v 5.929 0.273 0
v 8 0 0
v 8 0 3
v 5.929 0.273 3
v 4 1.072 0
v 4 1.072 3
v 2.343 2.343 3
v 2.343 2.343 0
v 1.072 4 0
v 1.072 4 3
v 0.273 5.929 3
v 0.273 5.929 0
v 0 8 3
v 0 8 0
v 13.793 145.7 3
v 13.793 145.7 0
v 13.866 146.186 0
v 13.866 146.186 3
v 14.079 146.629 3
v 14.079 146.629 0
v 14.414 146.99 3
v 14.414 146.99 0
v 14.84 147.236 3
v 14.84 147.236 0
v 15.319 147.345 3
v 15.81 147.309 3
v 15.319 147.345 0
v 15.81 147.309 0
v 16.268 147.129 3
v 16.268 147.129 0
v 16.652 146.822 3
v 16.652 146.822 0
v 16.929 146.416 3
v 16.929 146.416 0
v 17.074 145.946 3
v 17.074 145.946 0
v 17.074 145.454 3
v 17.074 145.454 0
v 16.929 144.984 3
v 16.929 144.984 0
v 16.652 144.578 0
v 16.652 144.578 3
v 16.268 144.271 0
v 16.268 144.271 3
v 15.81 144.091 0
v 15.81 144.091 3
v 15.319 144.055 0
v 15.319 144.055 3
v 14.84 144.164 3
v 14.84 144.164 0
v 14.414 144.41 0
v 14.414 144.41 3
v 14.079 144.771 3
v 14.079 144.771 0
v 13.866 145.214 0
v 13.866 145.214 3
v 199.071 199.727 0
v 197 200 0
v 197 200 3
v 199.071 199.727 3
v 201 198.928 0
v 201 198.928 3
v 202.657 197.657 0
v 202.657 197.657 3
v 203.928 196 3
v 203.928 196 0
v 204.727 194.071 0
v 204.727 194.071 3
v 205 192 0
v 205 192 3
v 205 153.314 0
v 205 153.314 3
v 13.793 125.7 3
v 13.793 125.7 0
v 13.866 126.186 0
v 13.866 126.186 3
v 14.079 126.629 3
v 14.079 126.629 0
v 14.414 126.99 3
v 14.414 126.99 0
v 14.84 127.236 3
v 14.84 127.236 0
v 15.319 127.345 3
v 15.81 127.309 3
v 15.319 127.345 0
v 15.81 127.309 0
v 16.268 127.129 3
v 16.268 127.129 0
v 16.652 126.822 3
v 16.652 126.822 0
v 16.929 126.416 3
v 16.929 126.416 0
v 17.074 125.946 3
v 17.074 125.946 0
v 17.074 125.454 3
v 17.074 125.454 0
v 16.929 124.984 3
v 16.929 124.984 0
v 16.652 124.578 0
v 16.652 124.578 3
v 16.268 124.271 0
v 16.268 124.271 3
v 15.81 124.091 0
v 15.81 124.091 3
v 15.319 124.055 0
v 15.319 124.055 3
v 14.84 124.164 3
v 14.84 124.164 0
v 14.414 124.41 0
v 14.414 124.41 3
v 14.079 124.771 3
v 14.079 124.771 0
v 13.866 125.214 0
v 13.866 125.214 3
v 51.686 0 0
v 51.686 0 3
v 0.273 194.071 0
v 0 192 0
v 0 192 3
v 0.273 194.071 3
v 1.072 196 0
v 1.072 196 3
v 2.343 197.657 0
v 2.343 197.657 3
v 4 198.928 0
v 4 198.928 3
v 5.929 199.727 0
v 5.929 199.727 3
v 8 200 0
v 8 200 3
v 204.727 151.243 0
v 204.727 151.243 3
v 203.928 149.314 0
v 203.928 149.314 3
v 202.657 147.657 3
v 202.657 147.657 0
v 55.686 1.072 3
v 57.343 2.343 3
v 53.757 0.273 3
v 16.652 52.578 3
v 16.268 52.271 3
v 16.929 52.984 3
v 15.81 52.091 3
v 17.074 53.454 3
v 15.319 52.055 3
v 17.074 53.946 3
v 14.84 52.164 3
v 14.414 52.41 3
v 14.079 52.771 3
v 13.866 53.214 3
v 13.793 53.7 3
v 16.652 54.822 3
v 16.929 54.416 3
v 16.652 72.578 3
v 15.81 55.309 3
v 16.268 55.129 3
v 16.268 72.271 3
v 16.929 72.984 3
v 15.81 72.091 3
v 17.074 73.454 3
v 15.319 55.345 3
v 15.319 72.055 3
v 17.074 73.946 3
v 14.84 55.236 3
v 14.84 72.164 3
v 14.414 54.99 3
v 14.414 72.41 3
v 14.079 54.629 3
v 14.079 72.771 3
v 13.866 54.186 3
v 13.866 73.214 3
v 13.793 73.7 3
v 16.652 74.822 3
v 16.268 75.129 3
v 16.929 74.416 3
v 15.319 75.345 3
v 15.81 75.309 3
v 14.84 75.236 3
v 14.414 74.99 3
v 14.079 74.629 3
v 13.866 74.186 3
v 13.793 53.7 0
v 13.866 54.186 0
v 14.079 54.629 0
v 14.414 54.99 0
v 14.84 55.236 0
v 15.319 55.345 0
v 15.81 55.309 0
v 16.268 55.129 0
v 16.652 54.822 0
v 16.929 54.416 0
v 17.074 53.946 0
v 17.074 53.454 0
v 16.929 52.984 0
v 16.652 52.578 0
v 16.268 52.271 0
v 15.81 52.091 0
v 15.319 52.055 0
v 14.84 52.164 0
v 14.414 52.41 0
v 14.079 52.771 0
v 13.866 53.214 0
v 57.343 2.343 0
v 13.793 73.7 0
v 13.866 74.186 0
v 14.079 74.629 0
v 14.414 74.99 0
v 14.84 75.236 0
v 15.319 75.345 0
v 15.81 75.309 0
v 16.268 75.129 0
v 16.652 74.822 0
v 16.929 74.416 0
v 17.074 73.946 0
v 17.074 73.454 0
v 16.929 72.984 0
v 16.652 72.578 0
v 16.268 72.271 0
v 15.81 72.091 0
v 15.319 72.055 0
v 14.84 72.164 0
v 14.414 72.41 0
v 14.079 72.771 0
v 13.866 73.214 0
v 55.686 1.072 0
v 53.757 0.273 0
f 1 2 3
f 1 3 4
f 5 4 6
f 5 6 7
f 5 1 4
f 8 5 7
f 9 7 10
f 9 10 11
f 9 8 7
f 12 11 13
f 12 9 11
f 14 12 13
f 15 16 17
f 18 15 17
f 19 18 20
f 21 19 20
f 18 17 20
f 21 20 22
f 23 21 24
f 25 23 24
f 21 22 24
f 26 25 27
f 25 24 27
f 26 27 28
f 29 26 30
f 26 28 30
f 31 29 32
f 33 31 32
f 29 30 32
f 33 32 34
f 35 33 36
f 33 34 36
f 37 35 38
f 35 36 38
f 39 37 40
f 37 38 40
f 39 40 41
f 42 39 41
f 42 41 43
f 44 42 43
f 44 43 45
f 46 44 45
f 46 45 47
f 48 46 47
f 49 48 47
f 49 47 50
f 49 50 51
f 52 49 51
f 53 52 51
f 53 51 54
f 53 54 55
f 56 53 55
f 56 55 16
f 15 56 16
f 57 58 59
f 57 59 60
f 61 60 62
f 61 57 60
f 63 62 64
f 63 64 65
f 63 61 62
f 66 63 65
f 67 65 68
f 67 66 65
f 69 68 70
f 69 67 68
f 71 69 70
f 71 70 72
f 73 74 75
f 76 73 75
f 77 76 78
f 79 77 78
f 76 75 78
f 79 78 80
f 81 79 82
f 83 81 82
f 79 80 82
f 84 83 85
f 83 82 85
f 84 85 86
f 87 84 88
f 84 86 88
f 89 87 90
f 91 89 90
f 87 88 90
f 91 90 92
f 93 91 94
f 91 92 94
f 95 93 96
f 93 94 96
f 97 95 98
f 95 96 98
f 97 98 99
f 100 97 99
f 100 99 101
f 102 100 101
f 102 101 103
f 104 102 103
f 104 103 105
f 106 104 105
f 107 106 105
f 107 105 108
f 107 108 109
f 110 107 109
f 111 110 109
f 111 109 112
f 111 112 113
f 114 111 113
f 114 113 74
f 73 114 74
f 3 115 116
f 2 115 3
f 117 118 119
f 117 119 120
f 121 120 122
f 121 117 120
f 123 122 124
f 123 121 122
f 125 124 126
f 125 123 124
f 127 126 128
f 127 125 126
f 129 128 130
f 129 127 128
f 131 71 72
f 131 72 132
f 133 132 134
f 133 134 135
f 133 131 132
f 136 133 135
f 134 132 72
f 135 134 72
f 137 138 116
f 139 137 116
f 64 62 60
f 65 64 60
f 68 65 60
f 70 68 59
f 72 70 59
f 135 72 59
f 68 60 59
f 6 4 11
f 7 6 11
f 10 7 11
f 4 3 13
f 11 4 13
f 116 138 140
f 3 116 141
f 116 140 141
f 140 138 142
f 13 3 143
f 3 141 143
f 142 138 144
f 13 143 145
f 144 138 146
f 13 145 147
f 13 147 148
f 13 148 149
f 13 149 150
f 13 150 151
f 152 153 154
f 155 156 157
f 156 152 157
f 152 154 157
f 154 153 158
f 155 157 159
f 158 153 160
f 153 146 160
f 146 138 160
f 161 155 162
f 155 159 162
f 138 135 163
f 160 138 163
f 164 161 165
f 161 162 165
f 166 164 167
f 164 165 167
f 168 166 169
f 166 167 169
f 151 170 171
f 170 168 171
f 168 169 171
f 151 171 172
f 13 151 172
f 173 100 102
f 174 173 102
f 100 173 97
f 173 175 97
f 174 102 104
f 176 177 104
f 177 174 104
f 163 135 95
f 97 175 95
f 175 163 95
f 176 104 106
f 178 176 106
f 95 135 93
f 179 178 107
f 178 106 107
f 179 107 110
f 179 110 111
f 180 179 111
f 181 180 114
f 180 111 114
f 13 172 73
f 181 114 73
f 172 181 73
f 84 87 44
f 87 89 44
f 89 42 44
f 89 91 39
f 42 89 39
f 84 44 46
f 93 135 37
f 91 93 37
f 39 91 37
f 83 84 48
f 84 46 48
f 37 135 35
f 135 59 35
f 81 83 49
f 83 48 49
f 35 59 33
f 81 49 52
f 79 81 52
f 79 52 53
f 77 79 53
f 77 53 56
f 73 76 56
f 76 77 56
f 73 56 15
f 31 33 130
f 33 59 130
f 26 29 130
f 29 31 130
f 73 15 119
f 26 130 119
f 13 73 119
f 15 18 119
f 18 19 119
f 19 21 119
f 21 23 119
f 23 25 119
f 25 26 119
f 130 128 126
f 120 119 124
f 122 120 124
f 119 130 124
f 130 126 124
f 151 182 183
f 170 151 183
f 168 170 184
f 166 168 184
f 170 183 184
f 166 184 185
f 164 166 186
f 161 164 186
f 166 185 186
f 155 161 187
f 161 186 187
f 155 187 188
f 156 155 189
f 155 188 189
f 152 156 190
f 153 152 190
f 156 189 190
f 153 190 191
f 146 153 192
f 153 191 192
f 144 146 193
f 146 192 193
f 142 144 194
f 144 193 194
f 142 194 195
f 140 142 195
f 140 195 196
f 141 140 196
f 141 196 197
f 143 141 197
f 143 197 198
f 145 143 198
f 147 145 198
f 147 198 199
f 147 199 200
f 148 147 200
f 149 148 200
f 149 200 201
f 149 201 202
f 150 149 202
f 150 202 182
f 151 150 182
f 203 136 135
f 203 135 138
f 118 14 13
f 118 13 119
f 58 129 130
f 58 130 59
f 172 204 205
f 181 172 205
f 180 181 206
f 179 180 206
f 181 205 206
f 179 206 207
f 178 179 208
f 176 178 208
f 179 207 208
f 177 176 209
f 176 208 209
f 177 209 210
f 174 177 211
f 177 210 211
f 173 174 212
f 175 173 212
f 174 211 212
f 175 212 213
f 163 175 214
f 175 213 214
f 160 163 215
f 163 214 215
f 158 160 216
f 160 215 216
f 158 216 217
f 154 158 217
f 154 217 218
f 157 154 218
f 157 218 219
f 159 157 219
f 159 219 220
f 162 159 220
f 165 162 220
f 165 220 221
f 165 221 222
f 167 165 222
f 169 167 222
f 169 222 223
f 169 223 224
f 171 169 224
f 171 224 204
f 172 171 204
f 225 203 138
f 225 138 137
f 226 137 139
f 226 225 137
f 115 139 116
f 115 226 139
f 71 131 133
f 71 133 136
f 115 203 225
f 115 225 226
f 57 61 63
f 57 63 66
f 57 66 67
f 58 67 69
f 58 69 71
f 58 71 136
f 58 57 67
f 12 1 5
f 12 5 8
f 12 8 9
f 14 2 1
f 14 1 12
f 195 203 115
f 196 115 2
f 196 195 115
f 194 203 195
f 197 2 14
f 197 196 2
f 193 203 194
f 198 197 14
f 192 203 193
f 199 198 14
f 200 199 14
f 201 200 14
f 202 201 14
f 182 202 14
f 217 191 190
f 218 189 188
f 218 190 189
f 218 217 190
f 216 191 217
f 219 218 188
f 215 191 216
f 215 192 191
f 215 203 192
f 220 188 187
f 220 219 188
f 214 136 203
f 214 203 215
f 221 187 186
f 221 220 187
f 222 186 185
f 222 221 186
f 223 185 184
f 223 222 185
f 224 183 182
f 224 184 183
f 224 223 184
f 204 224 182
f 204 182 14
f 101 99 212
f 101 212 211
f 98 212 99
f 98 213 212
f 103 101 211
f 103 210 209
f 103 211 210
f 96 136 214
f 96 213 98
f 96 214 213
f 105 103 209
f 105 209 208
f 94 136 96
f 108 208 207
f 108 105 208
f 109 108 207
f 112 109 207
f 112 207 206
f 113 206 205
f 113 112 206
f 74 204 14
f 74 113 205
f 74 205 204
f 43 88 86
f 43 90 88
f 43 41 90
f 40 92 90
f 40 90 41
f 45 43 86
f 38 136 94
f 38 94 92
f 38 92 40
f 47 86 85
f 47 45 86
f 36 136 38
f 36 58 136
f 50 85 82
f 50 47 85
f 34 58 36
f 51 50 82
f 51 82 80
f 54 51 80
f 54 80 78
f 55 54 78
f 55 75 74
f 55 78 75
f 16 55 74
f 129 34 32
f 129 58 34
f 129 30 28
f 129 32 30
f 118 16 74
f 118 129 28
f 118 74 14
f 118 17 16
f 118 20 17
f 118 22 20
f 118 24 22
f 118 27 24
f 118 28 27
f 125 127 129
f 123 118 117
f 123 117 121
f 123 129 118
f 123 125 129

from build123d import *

# Parameters (mm, degrees)
ESTRUSIONE_ESTRUSIONE1_DEPTH    = 3
PREFORO_DA_MASCHIARE_M4_1_D     = 3.3
PREFORO_DA_MASCHIARE_M4_1_DEPTH = 40.6
PREFORO_DA_MASCHIARE_M4_1_TIP   = 0.991420021


with BuildPart() as part:
    # Schizzo1 → Estrusione-Estrusione1 (new body)
    with BuildSketch(Plane.XY):
        with BuildLine():
            Line((0, 8), (0, 192))
            ThreePointArc((0, 192), (2.343145751, 197.656854249), (8, 200))
            Line((8, 200), (197, 200))
            ThreePointArc((197, 200), (202.656854249, 197.656854249), (205, 192))
            Line((205, 192), (205, 153.313708499))
            ThreePointArc((205, 153.313708499), (204.39103626, 150.25224104), (202.656854249, 147.656854249))
            Line((202.656854249, 147.656854249), (57.343145751, 2.343145751))
            ThreePointArc((57.343145751, 2.343145751), (54.74775896, 0.60896374), (51.686291501, 0))
            Line((51.686291501, 0), (8, 0))
            ThreePointArc((8, 0), (2.343145751, 2.343145751), (0, 8))
        make_face()
    extrude(amount=ESTRUSIONE_ESTRUSIONE1_DEPTH)

    # Preforo da maschiare M4-1
    with Locations(Plane.XY.offset(3)):
        with Locations((15.44269502, 145.7), (15.44269502, 125.7), (15.44269502, 73.7), (15.44269502, 53.7)):
            Hole(PREFORO_DA_MASCHIARE_M4_1_D / 2, depth=PREFORO_DA_MASCHIARE_M4_1_DEPTH)
            with Locations((0, 0, -(PREFORO_DA_MASCHIARE_M4_1_DEPTH + PREFORO_DA_MASCHIARE_M4_1_TIP / 2))):  # 118° drill point
                Cone(0, PREFORO_DA_MASCHIARE_M4_1_D / 2, PREFORO_DA_MASCHIARE_M4_1_TIP, mode=Mode.SUBTRACT)


solid = part.part
